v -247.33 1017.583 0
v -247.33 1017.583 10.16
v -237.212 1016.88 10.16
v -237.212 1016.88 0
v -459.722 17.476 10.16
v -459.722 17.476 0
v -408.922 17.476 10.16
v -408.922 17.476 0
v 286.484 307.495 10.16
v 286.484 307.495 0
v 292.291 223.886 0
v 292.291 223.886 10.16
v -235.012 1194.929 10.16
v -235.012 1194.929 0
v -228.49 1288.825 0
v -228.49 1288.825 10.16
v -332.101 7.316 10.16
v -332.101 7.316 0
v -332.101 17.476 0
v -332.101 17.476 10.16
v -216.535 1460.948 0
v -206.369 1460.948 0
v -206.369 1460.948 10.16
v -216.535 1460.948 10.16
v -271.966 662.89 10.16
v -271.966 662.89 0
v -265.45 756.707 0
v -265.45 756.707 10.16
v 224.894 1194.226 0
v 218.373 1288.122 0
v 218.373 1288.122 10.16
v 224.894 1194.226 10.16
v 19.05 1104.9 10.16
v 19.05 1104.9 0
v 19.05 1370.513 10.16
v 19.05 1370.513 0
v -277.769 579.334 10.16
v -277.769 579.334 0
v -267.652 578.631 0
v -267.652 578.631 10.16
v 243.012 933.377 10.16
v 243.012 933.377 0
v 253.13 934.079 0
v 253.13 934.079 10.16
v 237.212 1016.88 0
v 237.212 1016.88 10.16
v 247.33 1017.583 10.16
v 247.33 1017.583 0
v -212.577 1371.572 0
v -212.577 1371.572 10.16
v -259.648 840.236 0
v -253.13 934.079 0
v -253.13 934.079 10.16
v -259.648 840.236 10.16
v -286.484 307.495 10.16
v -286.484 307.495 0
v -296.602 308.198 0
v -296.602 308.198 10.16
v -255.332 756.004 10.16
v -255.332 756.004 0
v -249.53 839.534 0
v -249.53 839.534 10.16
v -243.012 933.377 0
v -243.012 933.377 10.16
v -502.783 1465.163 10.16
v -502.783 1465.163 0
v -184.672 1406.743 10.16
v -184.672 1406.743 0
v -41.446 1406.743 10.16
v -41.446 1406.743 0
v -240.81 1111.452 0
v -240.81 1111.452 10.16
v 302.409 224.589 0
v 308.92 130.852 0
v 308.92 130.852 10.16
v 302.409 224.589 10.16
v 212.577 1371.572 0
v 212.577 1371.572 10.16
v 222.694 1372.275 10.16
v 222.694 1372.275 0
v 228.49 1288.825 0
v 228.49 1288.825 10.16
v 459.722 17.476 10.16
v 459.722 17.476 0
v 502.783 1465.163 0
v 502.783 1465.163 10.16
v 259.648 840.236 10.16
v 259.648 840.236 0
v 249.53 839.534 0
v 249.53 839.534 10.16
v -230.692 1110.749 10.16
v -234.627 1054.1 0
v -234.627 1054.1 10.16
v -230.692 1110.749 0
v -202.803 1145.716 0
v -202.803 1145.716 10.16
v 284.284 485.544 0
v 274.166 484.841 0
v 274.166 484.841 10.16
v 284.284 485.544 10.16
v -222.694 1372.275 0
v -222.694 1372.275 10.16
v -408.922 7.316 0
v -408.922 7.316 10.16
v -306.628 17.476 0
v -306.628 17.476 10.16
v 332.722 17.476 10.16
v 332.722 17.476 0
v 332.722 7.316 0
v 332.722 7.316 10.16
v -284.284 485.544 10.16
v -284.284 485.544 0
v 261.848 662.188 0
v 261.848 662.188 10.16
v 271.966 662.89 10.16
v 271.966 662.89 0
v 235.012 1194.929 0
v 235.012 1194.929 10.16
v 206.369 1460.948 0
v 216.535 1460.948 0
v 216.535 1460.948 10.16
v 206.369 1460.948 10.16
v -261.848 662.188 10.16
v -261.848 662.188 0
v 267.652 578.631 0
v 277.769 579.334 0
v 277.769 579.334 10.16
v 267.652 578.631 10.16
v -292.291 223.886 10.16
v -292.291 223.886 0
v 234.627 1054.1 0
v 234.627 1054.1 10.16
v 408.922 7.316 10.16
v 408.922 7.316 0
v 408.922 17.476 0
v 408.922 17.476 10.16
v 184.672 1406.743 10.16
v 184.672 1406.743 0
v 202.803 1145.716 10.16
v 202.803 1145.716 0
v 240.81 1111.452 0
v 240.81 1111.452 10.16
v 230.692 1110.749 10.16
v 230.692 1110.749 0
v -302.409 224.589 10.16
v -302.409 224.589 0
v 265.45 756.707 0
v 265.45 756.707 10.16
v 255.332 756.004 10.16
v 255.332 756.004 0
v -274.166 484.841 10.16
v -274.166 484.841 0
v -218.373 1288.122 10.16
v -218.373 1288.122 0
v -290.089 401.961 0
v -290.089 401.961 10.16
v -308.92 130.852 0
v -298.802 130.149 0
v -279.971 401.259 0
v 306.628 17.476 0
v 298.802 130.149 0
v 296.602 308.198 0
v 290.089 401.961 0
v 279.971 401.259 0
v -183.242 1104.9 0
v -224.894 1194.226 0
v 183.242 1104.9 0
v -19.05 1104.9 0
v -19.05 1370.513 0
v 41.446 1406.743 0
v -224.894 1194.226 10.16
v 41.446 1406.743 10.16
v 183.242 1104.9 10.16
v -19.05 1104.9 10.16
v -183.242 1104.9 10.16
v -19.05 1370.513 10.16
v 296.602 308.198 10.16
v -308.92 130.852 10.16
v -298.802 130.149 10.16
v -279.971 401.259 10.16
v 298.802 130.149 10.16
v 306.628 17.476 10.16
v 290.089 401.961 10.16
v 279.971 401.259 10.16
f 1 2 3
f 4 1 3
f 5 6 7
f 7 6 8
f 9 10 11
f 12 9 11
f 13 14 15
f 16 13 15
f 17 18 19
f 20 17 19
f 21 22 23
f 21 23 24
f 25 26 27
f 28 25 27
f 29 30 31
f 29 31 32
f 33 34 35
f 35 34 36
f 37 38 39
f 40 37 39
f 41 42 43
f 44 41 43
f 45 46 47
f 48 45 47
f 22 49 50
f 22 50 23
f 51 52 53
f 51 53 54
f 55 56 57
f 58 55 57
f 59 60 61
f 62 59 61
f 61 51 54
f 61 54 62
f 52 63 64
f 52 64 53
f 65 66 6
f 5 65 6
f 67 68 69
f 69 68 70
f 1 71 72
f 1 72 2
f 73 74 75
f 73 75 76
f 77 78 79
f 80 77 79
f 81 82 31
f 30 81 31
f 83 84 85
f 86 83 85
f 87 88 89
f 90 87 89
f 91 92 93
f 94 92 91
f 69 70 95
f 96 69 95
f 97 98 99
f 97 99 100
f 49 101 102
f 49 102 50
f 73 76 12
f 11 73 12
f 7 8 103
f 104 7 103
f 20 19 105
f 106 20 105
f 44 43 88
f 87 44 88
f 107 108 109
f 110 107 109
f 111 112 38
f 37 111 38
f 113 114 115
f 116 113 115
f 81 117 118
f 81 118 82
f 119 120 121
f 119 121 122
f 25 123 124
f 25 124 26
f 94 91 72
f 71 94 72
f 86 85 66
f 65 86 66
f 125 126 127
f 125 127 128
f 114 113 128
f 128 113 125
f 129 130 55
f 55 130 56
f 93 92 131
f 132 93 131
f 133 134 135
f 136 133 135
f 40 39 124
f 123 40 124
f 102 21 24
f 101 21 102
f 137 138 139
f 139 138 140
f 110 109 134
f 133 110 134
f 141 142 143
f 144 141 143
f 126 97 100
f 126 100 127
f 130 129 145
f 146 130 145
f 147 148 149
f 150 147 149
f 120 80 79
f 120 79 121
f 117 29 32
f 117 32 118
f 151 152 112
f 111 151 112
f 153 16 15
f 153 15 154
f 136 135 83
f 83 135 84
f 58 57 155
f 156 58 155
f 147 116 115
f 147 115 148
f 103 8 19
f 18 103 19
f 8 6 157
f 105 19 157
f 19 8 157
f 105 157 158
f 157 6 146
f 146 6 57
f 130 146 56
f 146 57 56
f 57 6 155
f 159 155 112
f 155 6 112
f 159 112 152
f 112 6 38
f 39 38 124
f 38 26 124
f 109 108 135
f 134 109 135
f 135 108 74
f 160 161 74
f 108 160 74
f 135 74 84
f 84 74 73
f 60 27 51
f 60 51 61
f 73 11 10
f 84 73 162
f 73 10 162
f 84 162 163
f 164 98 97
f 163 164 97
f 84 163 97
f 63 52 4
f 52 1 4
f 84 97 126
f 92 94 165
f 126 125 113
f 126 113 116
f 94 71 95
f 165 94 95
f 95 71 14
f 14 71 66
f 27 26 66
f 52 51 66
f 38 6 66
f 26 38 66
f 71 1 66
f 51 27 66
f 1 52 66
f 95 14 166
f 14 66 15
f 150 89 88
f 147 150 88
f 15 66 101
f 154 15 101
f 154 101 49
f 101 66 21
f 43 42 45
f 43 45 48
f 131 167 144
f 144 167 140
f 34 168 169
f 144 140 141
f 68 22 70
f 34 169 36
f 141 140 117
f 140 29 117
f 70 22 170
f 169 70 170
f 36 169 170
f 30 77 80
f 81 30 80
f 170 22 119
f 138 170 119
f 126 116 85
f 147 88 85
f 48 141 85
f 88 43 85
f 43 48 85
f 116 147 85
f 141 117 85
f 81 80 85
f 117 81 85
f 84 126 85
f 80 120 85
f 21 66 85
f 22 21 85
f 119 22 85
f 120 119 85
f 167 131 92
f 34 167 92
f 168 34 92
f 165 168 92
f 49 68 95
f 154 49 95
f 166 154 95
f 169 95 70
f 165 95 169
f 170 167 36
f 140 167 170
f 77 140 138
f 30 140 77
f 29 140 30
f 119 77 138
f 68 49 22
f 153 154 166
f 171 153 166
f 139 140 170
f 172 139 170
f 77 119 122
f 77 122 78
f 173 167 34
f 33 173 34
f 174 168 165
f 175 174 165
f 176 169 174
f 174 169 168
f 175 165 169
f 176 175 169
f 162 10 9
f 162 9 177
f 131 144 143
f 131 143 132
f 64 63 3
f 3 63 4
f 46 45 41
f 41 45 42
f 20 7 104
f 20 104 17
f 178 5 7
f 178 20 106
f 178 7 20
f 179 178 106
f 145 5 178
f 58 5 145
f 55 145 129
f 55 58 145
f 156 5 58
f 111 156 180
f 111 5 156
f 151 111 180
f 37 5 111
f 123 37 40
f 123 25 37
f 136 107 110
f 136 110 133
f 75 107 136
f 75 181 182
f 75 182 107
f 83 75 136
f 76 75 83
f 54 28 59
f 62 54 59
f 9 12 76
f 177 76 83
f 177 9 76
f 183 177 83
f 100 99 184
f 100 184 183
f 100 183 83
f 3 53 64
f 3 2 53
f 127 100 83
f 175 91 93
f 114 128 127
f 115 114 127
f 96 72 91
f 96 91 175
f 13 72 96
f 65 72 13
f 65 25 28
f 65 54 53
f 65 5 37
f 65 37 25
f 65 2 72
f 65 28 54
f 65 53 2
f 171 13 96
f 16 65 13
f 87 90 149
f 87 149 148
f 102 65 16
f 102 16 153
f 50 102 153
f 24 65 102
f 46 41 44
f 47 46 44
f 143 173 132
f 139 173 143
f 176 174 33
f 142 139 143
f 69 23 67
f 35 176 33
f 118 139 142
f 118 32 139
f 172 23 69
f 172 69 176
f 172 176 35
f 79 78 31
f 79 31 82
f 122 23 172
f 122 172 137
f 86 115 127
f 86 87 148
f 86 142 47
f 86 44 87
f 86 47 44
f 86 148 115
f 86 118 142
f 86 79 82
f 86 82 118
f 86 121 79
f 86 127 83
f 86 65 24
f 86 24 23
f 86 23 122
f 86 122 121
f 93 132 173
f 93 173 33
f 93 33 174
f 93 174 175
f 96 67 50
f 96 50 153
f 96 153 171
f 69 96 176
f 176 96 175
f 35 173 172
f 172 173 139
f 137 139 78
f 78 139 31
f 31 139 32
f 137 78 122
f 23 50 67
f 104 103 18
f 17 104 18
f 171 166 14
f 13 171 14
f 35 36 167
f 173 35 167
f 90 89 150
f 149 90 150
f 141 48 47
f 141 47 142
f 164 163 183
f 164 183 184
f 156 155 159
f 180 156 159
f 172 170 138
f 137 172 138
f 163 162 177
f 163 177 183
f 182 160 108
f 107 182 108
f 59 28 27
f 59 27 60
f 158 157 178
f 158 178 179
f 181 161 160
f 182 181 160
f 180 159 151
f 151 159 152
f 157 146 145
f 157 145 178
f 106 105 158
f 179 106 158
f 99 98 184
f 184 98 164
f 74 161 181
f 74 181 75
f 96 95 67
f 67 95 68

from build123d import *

# Parameters (mm, degrees)
BOSS_EXTRUDE1_DEPTH = 10.16
CUT_EXTRUDE5_DEPTH  = 12.7


with BuildPart() as part:
    # Sketch1 → Boss-Extrude1 (new body)
    with BuildSketch(Plane.XY):
        Polygon((-502.783260205, 1465.163333881), (-459.721789204, 17.476365817), (-408.921789204, 17.476365817), (-408.921789204, 7.316365817), (-332.100796745, 7.316365817), (-332.100796745, 17.476365817), (-306.627827519, 17.476365817), (-234.627172097, 1054.1), (234.627172097, 1054.1), (306.627827519, 17.476365817), (332.721789205, 17.476365817), (332.721789205, 7.316365817), (408.921789205, 7.316365817), (408.921789205, 17.476365817), (459.721789204, 17.476365817), (502.783260205, 1465.163333881), align=None)
        Polygon((183.241684323, 1104.9), (19.05, 1104.9), (19.05, 1370.513438368), align=None, mode=Mode.SUBTRACT)
        Polygon((-184.672467887, 1406.743333881), (-41.445883295, 1406.743333881), (-202.80261453, 1145.716008632), align=None, mode=Mode.SUBTRACT)
        Polygon((-19.05, 1370.513438368), (-19.05, 1104.9), (-183.241684323, 1104.9), align=None, mode=Mode.SUBTRACT)
        Polygon((184.672467887, 1406.743333881), (202.80261453, 1145.716008632), (41.445883295, 1406.743333881), align=None, mode=Mode.SUBTRACT)
    extrude(amount=BOSS_EXTRUDE1_DEPTH)

    # Sketch2 → Cut-Extrude5 (cut)
    with BuildSketch(Plane.XY):
        Polygon((-222.69422447, 1372.274878096), (-212.576544386, 1371.572135487), (-206.36877838, 1460.947946306), (-216.535268781, 1460.947946306), align=None)
        Polygon((-224.894455765, 1194.225999066), (-235.012135849, 1194.928741675), (-228.490407278, 1288.824803216), (-218.372727194, 1288.122060607), align=None)
        Polygon((224.894455765, 1194.225999066), (235.012135849, 1194.928741675), (228.490407278, 1288.824803216), (218.372727194, 1288.122060607), align=None)
        Polygon((212.576544386, 1371.572135487), (222.694224471, 1372.274878096), (216.535268781, 1460.947946306), (206.36877838, 1460.947946306), align=None)
        Polygon((-240.810161517, 1111.452134365), (-247.330047228, 1017.582605255), (-237.212367144, 1016.879862645), (-230.692481433, 1110.749391756), align=None)
        Polygon((237.212367144, 1016.879862645), (247.330047228, 1017.582605255), (240.810161517, 1111.452134365), (230.692481433, 1110.749391756), align=None)
        Polygon((-298.801924037, 130.149180543), (-292.291252627, 223.886047498), (-302.408932711, 224.588790108), (-308.919604121, 130.851923152), align=None)
        Polygon((-243.012235672, 933.376722904), (-253.129915756, 934.079465513), (-259.647958606, 840.236468834), (-249.530278522, 839.533726225), align=None)
        Polygon((243.012235672, 933.376722904), (253.129915756, 934.079465513), (259.647958606, 840.236468834), (249.530278522, 839.533726225), align=None)
        Polygon((-274.16610128, 484.841453384), (-284.283781364, 485.544195993), (-277.769424233, 579.334127811), (-267.651744149, 578.631385201), align=None)
        Polygon((-261.848189901, 662.187589804), (-271.965869985, 662.890332413), (-265.449669994, 756.706796662), (-255.33198991, 756.004054053), align=None)
        Polygon((261.848189901, 662.187589804), (271.965869985, 662.890332413), (265.449669994, 756.706796662), (255.33198991, 756.004054053), align=None)
        Polygon((274.16610128, 484.841453384), (284.283781364, 485.544195993), (277.769424233, 579.334127811), (267.651744149, 578.631385201), align=None)
        Polygon((-286.484012658, 307.495316963), (-296.601692742, 308.198059572), (-290.089178472, 401.961458959), (-279.971498388, 401.25871635), align=None)
        Polygon((286.484012658, 307.495316963), (296.601692742, 308.198059572), (290.089178472, 401.961458959), (279.971498388, 401.25871635), align=None)
        Polygon((298.801924037, 130.149180543), (308.919604121, 130.851923152), (302.408932711, 224.588790108), (292.291252627, 223.886047498), align=None)
    extrude(amount=CUT_EXTRUDE5_DEPTH, mode=Mode.SUBTRACT)


solid = part.part
